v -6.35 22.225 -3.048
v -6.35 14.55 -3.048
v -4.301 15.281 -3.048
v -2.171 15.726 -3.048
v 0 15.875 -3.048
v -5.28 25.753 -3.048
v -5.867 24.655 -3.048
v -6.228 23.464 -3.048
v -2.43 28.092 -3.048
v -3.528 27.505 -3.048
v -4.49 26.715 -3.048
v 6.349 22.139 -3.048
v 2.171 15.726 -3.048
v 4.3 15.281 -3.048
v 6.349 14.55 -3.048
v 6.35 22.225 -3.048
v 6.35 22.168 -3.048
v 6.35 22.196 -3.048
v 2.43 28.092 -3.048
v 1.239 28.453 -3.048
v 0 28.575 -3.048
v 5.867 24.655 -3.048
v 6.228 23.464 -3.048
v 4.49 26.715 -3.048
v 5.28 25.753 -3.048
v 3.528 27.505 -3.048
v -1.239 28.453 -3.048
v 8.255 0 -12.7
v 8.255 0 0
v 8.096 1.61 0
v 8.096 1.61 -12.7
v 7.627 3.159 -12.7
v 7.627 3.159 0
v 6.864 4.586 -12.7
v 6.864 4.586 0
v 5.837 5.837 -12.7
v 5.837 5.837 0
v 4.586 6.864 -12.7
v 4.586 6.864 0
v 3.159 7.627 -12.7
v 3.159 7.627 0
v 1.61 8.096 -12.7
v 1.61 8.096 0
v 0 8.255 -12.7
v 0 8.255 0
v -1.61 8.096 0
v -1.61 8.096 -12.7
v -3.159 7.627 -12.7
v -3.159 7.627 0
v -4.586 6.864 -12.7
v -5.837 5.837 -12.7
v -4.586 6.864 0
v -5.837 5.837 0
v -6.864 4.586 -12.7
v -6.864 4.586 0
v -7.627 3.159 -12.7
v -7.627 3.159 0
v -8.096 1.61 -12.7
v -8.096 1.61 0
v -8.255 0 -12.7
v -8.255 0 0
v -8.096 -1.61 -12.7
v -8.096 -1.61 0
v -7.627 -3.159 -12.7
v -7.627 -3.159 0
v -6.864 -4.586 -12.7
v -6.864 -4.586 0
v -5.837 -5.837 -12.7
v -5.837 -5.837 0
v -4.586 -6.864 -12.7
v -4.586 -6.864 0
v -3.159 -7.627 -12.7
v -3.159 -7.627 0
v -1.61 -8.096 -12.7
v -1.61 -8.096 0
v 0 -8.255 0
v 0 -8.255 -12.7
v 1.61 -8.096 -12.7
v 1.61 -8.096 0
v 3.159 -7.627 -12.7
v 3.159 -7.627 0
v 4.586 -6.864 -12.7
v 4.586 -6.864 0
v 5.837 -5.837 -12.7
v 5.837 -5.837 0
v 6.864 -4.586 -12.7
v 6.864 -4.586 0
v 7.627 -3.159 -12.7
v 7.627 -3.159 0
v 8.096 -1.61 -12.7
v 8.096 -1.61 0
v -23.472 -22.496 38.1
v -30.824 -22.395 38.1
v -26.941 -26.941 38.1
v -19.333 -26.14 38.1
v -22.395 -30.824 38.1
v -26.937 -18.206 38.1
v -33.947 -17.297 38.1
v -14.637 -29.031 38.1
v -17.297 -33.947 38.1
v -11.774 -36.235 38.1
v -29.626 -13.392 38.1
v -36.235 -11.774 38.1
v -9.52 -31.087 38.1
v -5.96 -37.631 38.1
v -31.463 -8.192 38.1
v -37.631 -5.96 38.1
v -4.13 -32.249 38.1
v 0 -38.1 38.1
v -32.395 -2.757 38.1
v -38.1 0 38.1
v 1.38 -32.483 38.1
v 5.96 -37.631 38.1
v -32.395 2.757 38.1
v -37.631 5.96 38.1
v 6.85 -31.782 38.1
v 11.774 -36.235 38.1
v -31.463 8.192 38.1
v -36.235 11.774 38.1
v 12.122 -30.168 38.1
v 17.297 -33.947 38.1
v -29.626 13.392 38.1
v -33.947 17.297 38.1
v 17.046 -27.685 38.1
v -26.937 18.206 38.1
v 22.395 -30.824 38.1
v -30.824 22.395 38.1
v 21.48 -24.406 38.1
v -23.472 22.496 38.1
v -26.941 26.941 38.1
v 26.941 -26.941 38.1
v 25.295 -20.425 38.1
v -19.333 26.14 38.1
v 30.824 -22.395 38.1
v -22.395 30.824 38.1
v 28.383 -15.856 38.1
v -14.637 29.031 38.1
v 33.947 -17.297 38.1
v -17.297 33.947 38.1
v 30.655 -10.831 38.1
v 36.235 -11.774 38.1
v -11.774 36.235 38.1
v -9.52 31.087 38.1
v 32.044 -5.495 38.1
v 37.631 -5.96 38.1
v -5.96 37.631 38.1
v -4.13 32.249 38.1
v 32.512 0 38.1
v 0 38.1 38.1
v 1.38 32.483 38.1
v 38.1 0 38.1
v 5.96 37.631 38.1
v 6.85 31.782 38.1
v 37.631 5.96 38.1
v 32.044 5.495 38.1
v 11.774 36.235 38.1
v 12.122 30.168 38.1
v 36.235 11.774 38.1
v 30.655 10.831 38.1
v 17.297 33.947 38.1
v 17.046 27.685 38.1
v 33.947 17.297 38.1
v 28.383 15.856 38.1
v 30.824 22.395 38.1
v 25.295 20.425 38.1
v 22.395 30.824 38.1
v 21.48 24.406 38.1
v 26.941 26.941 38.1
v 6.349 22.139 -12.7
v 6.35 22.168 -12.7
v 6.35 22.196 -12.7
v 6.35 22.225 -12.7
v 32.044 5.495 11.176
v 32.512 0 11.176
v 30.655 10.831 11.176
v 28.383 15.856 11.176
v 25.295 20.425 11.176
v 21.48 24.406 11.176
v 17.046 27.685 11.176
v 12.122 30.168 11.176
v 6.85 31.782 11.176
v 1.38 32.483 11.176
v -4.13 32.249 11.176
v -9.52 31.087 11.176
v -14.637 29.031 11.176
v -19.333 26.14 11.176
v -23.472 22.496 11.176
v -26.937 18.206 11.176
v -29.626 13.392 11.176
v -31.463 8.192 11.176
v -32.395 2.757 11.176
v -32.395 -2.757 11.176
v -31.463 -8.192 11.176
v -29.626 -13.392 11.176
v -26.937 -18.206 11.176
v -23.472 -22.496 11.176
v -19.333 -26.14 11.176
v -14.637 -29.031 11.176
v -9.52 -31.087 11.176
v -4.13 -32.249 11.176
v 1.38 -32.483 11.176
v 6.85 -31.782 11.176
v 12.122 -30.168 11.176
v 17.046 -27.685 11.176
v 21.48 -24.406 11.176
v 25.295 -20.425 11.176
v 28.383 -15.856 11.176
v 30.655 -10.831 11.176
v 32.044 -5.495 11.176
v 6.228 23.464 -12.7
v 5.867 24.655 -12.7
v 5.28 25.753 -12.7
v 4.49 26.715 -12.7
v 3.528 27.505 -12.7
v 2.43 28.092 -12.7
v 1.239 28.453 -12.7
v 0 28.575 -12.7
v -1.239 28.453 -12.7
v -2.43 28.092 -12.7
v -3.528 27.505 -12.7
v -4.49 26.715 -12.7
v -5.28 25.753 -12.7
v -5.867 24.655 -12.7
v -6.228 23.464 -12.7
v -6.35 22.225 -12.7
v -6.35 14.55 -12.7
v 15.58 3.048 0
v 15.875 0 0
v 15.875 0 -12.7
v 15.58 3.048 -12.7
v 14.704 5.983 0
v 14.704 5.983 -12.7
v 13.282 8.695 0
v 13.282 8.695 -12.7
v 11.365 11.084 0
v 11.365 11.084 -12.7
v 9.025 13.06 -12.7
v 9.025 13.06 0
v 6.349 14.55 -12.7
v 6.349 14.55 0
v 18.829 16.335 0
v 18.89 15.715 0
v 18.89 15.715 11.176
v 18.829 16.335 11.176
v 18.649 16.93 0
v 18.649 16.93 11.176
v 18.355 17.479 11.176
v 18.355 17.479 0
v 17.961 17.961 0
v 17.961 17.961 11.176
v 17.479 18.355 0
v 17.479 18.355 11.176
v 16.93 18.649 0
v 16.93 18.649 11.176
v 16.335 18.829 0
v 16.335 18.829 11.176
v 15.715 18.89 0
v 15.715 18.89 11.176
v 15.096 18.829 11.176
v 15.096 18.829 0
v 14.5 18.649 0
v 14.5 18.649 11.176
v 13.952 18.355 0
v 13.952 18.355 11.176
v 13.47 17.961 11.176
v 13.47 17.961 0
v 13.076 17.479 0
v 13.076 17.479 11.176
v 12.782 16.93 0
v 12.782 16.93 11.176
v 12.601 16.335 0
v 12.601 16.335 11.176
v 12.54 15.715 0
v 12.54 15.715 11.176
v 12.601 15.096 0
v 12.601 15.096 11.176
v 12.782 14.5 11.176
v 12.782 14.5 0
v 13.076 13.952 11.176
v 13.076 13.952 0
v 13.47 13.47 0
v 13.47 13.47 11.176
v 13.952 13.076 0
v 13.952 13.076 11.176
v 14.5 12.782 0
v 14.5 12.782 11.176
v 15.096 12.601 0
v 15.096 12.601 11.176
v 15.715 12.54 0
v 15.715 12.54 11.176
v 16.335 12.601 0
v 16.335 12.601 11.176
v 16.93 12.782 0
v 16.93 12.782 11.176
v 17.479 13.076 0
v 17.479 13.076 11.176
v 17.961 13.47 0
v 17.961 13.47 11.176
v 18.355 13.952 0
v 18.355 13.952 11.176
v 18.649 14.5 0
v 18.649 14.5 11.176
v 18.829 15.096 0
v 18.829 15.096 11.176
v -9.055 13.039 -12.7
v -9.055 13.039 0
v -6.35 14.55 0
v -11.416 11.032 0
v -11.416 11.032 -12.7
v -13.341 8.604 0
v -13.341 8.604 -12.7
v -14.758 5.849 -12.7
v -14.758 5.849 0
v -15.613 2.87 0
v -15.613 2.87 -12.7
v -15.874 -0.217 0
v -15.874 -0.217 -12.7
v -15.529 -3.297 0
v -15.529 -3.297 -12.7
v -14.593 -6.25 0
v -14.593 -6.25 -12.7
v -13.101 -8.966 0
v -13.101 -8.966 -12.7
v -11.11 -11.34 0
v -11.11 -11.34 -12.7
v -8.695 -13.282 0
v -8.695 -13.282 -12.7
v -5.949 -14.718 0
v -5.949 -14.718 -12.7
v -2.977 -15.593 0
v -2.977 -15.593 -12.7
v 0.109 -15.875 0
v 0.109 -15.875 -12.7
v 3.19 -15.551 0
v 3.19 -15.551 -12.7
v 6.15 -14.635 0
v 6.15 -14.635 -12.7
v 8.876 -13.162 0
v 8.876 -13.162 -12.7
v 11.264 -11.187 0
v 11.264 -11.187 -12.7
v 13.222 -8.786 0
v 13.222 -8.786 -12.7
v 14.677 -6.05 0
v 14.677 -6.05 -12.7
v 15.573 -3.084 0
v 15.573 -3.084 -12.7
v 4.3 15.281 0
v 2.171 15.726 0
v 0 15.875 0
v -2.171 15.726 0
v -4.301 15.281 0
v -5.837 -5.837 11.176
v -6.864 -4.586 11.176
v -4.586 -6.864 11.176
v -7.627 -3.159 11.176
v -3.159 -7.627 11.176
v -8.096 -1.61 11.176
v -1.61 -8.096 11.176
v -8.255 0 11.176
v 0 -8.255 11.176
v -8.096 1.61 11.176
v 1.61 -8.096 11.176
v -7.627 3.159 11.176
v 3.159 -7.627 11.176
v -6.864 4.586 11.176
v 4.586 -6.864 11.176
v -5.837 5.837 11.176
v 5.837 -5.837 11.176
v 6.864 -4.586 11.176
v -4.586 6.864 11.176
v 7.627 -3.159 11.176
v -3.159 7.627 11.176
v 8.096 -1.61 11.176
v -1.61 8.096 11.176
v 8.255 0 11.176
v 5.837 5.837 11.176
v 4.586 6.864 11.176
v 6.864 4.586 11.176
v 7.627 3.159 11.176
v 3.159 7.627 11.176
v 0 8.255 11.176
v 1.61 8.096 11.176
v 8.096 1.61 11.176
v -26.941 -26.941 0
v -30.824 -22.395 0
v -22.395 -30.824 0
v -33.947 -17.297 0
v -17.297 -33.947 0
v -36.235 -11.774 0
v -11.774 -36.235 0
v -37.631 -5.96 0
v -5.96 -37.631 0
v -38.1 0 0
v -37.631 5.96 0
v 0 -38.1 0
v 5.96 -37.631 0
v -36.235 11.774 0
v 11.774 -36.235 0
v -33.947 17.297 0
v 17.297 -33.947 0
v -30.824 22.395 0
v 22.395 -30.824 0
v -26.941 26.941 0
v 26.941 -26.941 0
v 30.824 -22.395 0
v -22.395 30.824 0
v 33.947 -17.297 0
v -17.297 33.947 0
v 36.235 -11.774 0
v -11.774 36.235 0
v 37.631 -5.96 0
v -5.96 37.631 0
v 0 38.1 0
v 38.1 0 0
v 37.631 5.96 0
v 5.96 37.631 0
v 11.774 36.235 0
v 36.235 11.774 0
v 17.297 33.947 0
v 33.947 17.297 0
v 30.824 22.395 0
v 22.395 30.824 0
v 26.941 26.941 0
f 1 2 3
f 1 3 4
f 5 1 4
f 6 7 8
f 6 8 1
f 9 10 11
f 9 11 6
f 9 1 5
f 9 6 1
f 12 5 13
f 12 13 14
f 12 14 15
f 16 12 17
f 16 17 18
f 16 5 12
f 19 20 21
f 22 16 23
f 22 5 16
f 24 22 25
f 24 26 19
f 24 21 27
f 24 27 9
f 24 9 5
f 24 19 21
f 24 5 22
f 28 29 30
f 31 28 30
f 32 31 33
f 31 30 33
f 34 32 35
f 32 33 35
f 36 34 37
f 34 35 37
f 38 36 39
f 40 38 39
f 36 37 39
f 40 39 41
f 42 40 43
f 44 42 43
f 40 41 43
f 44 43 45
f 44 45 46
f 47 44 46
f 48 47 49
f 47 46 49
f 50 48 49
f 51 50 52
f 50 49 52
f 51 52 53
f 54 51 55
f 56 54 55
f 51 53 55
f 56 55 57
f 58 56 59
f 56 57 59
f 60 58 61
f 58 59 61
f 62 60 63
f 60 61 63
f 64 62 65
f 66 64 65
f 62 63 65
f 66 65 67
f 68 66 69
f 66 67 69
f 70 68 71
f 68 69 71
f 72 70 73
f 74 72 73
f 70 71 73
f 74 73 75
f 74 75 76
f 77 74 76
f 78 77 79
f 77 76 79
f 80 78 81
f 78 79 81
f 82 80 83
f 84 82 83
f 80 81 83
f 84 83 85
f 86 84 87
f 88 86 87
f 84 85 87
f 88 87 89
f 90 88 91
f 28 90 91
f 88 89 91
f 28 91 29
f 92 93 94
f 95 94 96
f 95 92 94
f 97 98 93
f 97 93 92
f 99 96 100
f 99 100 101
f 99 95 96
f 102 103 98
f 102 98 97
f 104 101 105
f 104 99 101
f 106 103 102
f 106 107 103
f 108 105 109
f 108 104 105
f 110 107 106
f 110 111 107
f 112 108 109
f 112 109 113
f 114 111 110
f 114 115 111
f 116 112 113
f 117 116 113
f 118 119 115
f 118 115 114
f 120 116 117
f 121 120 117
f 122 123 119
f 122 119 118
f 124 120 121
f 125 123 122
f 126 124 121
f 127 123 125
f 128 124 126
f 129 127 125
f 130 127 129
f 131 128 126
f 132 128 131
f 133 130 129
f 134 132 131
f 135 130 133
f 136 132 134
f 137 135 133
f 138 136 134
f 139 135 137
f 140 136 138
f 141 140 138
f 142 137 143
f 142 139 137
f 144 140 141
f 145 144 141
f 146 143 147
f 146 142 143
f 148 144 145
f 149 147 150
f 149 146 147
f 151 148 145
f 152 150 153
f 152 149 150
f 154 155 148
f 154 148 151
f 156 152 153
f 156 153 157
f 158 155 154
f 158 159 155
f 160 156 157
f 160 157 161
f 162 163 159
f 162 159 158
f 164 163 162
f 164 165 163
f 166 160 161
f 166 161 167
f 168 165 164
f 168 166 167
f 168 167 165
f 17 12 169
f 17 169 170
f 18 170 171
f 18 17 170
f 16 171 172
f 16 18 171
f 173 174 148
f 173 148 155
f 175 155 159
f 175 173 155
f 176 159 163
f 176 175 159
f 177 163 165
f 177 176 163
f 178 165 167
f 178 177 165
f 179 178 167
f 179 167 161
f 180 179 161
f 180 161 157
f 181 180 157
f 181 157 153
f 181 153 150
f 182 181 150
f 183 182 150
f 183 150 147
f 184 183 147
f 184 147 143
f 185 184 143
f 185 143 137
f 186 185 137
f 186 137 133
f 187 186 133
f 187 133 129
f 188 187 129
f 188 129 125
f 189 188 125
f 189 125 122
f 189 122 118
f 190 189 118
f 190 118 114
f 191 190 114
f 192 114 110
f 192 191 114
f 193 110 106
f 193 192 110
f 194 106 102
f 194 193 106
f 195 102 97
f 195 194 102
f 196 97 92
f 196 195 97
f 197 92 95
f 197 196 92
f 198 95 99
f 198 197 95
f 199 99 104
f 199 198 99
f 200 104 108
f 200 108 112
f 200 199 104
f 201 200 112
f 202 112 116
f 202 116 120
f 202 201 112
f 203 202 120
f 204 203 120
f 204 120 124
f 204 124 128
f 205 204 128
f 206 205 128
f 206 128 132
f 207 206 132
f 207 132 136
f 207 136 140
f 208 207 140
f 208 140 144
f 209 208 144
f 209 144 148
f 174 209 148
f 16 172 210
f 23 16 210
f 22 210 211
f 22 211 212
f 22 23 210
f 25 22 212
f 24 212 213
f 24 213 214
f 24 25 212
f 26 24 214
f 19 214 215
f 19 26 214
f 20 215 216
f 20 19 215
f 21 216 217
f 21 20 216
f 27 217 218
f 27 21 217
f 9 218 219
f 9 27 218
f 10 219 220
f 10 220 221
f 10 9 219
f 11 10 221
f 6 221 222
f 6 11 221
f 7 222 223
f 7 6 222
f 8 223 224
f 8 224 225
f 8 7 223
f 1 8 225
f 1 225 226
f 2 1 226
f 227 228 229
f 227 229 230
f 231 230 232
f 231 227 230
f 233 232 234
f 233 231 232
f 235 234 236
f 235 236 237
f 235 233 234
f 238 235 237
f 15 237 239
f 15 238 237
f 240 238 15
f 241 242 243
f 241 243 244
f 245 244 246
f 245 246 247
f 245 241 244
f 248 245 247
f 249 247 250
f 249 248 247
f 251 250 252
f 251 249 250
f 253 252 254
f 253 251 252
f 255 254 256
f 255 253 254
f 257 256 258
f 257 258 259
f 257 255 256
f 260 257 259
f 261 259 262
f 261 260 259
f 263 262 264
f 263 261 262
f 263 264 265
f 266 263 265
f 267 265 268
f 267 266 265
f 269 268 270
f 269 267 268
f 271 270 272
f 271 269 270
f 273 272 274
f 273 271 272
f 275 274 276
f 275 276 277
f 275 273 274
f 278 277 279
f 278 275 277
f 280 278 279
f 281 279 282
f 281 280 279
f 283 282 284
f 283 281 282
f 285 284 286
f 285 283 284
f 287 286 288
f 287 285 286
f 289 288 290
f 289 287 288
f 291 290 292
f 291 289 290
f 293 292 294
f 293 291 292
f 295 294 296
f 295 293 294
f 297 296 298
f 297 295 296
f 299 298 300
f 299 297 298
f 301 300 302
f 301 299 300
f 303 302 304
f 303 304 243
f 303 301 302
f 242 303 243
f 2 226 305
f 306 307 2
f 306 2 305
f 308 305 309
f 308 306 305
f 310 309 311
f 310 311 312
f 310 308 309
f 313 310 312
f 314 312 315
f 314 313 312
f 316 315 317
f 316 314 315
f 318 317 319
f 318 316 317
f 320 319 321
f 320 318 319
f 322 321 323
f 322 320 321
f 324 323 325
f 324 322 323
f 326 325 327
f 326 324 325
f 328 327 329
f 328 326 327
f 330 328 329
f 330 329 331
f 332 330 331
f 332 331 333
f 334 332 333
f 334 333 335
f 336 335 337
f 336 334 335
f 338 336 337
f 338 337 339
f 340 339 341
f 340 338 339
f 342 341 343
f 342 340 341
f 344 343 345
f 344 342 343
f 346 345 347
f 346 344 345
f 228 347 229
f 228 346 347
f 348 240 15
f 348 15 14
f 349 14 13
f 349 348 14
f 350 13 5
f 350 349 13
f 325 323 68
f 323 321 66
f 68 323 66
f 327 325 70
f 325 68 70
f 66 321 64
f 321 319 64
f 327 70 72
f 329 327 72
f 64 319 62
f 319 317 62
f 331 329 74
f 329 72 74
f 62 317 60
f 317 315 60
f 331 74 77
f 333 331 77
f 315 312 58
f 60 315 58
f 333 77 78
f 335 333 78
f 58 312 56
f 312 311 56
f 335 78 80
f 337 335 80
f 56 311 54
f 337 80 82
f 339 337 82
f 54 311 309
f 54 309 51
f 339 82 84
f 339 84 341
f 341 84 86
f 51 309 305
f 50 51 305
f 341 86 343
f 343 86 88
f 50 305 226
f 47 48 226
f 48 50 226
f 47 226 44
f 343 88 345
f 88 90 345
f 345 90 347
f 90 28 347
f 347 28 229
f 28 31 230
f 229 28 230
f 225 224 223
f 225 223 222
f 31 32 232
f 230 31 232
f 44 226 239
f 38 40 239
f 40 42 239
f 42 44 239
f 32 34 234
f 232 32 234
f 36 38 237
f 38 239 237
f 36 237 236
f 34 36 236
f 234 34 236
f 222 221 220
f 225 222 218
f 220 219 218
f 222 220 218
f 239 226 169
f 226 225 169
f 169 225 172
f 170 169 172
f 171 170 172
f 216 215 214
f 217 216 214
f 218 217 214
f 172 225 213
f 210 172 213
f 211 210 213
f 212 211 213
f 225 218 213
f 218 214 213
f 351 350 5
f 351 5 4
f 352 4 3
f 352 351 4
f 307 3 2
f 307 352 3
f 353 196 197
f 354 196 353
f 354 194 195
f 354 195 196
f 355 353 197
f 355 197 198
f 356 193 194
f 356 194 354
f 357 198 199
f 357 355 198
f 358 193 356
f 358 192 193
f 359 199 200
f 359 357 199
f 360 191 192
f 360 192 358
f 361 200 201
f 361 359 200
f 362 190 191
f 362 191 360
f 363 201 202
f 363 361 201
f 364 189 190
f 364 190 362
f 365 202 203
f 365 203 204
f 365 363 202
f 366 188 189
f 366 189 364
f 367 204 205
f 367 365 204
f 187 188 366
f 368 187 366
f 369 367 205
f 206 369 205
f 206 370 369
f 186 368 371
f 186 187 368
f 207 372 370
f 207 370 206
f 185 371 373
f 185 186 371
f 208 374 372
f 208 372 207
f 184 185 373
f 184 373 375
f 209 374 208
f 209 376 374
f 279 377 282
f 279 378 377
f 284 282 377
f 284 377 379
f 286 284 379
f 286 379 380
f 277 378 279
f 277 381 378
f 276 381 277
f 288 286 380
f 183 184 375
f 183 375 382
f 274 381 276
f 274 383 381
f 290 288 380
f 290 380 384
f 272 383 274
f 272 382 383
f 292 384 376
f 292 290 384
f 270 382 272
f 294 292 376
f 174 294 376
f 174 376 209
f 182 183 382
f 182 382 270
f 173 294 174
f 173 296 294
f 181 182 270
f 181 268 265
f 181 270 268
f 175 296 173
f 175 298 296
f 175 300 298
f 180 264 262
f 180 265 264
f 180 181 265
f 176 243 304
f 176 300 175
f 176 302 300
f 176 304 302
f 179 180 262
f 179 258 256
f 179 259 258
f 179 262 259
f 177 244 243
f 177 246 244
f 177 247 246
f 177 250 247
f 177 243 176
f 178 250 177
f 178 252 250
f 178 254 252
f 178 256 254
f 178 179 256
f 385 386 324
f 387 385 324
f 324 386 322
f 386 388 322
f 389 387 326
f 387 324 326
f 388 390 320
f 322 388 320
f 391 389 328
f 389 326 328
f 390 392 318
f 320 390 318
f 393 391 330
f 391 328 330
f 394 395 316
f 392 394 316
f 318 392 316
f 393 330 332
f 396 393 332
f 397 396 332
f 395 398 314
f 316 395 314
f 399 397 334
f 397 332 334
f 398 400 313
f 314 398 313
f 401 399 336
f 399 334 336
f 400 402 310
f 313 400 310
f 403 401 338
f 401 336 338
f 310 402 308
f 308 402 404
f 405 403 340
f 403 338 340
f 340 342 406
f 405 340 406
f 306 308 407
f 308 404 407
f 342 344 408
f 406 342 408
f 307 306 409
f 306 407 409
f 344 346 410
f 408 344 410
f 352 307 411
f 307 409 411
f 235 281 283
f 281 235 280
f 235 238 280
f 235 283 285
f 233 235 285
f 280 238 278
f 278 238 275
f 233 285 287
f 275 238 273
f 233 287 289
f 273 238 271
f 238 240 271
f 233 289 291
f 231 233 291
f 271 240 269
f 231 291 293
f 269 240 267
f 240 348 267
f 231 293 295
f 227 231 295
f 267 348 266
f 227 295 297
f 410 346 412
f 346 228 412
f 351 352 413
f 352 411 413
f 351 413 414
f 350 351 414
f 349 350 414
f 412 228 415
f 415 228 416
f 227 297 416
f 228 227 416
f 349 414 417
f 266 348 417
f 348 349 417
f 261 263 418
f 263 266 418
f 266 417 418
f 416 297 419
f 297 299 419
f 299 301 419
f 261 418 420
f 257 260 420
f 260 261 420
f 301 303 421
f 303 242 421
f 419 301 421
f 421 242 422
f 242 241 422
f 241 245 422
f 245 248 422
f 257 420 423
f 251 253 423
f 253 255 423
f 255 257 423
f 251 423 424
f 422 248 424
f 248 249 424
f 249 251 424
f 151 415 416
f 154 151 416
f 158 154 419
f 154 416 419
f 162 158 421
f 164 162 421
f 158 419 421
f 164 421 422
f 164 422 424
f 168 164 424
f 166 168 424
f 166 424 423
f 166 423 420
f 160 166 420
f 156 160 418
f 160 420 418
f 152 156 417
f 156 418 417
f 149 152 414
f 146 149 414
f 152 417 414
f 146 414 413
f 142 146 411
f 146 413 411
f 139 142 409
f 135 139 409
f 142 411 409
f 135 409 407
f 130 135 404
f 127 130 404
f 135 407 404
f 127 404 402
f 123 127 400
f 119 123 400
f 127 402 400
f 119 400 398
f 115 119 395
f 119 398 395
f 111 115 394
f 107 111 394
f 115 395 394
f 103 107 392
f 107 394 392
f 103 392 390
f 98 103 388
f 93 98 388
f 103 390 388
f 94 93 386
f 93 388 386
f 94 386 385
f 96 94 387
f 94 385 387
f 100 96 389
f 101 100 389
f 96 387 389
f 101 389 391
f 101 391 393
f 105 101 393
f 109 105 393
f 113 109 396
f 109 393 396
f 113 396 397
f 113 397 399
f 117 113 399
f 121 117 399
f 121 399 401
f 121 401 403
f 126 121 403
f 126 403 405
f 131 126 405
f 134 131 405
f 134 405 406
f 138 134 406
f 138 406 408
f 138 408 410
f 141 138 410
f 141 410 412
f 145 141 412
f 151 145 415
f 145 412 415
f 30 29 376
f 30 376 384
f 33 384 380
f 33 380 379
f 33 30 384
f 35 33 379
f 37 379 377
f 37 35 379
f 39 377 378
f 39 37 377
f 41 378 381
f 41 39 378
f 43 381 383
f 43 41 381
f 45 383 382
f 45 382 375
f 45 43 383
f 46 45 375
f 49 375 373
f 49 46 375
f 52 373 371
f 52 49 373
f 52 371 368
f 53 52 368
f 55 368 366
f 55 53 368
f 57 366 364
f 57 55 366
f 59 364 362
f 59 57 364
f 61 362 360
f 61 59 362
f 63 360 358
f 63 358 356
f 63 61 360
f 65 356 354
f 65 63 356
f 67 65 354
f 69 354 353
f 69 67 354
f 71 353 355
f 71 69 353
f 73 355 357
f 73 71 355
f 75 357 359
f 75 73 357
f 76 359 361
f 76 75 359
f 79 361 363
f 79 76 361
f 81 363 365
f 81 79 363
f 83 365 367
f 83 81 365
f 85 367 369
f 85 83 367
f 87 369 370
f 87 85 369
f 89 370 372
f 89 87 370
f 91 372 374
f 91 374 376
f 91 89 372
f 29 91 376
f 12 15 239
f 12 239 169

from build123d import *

# Parameters (mm, degrees)
F0_R          = 38.1
F0_R_2        = 32.512
F1_DEPTH      = 38.1
F0_R_3        = 3.175
F2_DEPTH      = 11.176
F0_R_4        = 8.255
F3_DEPTH      = 11.176
F3_DEPTH_BACK = 12.7
F4_START      = -3.048
F4_DEPTH      = 9.652


with BuildPart() as f1:
    # F0 (on Top) → F1 (new body)
    with BuildSketch(Plane.XY):
        Circle(F0_R)
        Circle(F0_R_2, mode=Mode.SUBTRACT)
    extrude(amount=F1_DEPTH)

    # F0 (on Top) → F2 (join)
    with BuildSketch(Plane.XY):
        Circle(F0_R_2)
        with BuildLine():
            ThreePointArc((6.3494223473, 14.5499299262), (13.2818053133, 8.6953592576), (15.875, 0))
            ThreePointArc((15.875, 0), (-8.6950956004, -13.2819779212), (-6.35, 14.5496778315))
            Line((-6.35, 14.5496778315), (-6.35, 22.225))
            ThreePointArc((-6.35, 22.225), (0, 28.575), (6.35, 22.225))
            ThreePointArc((6.35, 22.225), (6.3498555852, 22.18217422), (6.3494223473, 22.139350388))
            Line((6.3494223473, 22.139350388), (6.3494223473, 14.5499299262))
        make_face(mode=Mode.SUBTRACT)
        with Locations((15.7154482119, 15.7154482119)):
            Circle(F0_R_3, mode=Mode.SUBTRACT)
        with BuildLine():
            ThreePointArc((-6.35, 22.225), (-4.4901280605, 17.7348719395), (0, 15.875))
            ThreePointArc((0, 15.875), (4.4597435444, 17.7046916568), (6.3494223473, 22.139350388))
            ThreePointArc((6.3494223473, 22.139350388), (6.3498555852, 22.18217422), (6.35, 22.225))
            ThreePointArc((6.35, 22.225), (0, 28.575), (-6.35, 22.225))
        make_face()
        with BuildLine():
            ThreePointArc((0, 15.875), (3.2431071076, 15.5402020994), (6.3494223473, 14.5499299262))
            Line((6.3494223473, 14.5499299262), (6.3494223473, 22.139350388))
            ThreePointArc((6.3494223473, 22.139350388), (4.4597435444, 17.7046916568), (0, 15.875))
        make_face()
        with BuildLine():
            Line((-6.35, 22.225), (-6.35, 14.5496778315))
            ThreePointArc((-6.35, 14.5496778315), (-3.2434155936, 15.5401377178), (0, 15.875))
            ThreePointArc((0, 15.875), (-4.4901280605, 17.7348719395), (-6.35, 22.225))
        make_face()
    extrude(amount=F2_DEPTH)

    # F0 (on Top) → F3 (join, two sides)
    with BuildSketch(Plane.XY) as f3_sk:
        with BuildLine():
            ThreePointArc((-6.35, 14.5496778315), (-8.6950956004, -13.2819779212), (15.875, 0))
            ThreePointArc((15.875, 0), (13.2818053133, 8.6953592576), (6.3494223473, 14.5499299262))
            ThreePointArc((6.3494223473, 14.5499299262), (3.2431071076, 15.5402020994), (0, 15.875))
            ThreePointArc((0, 15.875), (-3.2434155936, 15.5401377178), (-6.35, 14.5496778315))
        make_face()
        Circle(F0_R_4, mode=Mode.SUBTRACT)
    extrude(amount=F3_DEPTH)
    extrude(f3_sk.sketch, amount=-F3_DEPTH_BACK)

    # F0 (on Top) → F4 (join)
    with BuildSketch(Plane.XY.offset(F4_START)):
        with BuildLine():
            ThreePointArc((-6.35, 22.225), (-4.4901280605, 17.7348719395), (0, 15.875))
            ThreePointArc((0, 15.875), (4.4597435444, 17.7046916568), (6.3494223473, 22.139350388))
            ThreePointArc((6.3494223473, 22.139350388), (6.3498555852, 22.18217422), (6.35, 22.225))
            ThreePointArc((6.35, 22.225), (0, 28.575), (-6.35, 22.225))
        make_face()
        with BuildLine():
            Line((-6.35, 22.225), (-6.35, 14.5496778315))
            ThreePointArc((-6.35, 14.5496778315), (-3.2434155936, 15.5401377178), (0, 15.875))
            ThreePointArc((0, 15.875), (-4.4901280605, 17.7348719395), (-6.35, 22.225))
        make_face()
        with BuildLine():
            ThreePointArc((0, 15.875), (3.2431071076, 15.5402020994), (6.3494223473, 14.5499299262))
            Line((6.3494223473, 14.5499299262), (6.3494223473, 22.139350388))
            ThreePointArc((6.3494223473, 22.139350388), (4.4597435444, 17.7046916568), (0, 15.875))
        make_face()
    extrude(amount=-F4_DEPTH)


solid = f1.part
